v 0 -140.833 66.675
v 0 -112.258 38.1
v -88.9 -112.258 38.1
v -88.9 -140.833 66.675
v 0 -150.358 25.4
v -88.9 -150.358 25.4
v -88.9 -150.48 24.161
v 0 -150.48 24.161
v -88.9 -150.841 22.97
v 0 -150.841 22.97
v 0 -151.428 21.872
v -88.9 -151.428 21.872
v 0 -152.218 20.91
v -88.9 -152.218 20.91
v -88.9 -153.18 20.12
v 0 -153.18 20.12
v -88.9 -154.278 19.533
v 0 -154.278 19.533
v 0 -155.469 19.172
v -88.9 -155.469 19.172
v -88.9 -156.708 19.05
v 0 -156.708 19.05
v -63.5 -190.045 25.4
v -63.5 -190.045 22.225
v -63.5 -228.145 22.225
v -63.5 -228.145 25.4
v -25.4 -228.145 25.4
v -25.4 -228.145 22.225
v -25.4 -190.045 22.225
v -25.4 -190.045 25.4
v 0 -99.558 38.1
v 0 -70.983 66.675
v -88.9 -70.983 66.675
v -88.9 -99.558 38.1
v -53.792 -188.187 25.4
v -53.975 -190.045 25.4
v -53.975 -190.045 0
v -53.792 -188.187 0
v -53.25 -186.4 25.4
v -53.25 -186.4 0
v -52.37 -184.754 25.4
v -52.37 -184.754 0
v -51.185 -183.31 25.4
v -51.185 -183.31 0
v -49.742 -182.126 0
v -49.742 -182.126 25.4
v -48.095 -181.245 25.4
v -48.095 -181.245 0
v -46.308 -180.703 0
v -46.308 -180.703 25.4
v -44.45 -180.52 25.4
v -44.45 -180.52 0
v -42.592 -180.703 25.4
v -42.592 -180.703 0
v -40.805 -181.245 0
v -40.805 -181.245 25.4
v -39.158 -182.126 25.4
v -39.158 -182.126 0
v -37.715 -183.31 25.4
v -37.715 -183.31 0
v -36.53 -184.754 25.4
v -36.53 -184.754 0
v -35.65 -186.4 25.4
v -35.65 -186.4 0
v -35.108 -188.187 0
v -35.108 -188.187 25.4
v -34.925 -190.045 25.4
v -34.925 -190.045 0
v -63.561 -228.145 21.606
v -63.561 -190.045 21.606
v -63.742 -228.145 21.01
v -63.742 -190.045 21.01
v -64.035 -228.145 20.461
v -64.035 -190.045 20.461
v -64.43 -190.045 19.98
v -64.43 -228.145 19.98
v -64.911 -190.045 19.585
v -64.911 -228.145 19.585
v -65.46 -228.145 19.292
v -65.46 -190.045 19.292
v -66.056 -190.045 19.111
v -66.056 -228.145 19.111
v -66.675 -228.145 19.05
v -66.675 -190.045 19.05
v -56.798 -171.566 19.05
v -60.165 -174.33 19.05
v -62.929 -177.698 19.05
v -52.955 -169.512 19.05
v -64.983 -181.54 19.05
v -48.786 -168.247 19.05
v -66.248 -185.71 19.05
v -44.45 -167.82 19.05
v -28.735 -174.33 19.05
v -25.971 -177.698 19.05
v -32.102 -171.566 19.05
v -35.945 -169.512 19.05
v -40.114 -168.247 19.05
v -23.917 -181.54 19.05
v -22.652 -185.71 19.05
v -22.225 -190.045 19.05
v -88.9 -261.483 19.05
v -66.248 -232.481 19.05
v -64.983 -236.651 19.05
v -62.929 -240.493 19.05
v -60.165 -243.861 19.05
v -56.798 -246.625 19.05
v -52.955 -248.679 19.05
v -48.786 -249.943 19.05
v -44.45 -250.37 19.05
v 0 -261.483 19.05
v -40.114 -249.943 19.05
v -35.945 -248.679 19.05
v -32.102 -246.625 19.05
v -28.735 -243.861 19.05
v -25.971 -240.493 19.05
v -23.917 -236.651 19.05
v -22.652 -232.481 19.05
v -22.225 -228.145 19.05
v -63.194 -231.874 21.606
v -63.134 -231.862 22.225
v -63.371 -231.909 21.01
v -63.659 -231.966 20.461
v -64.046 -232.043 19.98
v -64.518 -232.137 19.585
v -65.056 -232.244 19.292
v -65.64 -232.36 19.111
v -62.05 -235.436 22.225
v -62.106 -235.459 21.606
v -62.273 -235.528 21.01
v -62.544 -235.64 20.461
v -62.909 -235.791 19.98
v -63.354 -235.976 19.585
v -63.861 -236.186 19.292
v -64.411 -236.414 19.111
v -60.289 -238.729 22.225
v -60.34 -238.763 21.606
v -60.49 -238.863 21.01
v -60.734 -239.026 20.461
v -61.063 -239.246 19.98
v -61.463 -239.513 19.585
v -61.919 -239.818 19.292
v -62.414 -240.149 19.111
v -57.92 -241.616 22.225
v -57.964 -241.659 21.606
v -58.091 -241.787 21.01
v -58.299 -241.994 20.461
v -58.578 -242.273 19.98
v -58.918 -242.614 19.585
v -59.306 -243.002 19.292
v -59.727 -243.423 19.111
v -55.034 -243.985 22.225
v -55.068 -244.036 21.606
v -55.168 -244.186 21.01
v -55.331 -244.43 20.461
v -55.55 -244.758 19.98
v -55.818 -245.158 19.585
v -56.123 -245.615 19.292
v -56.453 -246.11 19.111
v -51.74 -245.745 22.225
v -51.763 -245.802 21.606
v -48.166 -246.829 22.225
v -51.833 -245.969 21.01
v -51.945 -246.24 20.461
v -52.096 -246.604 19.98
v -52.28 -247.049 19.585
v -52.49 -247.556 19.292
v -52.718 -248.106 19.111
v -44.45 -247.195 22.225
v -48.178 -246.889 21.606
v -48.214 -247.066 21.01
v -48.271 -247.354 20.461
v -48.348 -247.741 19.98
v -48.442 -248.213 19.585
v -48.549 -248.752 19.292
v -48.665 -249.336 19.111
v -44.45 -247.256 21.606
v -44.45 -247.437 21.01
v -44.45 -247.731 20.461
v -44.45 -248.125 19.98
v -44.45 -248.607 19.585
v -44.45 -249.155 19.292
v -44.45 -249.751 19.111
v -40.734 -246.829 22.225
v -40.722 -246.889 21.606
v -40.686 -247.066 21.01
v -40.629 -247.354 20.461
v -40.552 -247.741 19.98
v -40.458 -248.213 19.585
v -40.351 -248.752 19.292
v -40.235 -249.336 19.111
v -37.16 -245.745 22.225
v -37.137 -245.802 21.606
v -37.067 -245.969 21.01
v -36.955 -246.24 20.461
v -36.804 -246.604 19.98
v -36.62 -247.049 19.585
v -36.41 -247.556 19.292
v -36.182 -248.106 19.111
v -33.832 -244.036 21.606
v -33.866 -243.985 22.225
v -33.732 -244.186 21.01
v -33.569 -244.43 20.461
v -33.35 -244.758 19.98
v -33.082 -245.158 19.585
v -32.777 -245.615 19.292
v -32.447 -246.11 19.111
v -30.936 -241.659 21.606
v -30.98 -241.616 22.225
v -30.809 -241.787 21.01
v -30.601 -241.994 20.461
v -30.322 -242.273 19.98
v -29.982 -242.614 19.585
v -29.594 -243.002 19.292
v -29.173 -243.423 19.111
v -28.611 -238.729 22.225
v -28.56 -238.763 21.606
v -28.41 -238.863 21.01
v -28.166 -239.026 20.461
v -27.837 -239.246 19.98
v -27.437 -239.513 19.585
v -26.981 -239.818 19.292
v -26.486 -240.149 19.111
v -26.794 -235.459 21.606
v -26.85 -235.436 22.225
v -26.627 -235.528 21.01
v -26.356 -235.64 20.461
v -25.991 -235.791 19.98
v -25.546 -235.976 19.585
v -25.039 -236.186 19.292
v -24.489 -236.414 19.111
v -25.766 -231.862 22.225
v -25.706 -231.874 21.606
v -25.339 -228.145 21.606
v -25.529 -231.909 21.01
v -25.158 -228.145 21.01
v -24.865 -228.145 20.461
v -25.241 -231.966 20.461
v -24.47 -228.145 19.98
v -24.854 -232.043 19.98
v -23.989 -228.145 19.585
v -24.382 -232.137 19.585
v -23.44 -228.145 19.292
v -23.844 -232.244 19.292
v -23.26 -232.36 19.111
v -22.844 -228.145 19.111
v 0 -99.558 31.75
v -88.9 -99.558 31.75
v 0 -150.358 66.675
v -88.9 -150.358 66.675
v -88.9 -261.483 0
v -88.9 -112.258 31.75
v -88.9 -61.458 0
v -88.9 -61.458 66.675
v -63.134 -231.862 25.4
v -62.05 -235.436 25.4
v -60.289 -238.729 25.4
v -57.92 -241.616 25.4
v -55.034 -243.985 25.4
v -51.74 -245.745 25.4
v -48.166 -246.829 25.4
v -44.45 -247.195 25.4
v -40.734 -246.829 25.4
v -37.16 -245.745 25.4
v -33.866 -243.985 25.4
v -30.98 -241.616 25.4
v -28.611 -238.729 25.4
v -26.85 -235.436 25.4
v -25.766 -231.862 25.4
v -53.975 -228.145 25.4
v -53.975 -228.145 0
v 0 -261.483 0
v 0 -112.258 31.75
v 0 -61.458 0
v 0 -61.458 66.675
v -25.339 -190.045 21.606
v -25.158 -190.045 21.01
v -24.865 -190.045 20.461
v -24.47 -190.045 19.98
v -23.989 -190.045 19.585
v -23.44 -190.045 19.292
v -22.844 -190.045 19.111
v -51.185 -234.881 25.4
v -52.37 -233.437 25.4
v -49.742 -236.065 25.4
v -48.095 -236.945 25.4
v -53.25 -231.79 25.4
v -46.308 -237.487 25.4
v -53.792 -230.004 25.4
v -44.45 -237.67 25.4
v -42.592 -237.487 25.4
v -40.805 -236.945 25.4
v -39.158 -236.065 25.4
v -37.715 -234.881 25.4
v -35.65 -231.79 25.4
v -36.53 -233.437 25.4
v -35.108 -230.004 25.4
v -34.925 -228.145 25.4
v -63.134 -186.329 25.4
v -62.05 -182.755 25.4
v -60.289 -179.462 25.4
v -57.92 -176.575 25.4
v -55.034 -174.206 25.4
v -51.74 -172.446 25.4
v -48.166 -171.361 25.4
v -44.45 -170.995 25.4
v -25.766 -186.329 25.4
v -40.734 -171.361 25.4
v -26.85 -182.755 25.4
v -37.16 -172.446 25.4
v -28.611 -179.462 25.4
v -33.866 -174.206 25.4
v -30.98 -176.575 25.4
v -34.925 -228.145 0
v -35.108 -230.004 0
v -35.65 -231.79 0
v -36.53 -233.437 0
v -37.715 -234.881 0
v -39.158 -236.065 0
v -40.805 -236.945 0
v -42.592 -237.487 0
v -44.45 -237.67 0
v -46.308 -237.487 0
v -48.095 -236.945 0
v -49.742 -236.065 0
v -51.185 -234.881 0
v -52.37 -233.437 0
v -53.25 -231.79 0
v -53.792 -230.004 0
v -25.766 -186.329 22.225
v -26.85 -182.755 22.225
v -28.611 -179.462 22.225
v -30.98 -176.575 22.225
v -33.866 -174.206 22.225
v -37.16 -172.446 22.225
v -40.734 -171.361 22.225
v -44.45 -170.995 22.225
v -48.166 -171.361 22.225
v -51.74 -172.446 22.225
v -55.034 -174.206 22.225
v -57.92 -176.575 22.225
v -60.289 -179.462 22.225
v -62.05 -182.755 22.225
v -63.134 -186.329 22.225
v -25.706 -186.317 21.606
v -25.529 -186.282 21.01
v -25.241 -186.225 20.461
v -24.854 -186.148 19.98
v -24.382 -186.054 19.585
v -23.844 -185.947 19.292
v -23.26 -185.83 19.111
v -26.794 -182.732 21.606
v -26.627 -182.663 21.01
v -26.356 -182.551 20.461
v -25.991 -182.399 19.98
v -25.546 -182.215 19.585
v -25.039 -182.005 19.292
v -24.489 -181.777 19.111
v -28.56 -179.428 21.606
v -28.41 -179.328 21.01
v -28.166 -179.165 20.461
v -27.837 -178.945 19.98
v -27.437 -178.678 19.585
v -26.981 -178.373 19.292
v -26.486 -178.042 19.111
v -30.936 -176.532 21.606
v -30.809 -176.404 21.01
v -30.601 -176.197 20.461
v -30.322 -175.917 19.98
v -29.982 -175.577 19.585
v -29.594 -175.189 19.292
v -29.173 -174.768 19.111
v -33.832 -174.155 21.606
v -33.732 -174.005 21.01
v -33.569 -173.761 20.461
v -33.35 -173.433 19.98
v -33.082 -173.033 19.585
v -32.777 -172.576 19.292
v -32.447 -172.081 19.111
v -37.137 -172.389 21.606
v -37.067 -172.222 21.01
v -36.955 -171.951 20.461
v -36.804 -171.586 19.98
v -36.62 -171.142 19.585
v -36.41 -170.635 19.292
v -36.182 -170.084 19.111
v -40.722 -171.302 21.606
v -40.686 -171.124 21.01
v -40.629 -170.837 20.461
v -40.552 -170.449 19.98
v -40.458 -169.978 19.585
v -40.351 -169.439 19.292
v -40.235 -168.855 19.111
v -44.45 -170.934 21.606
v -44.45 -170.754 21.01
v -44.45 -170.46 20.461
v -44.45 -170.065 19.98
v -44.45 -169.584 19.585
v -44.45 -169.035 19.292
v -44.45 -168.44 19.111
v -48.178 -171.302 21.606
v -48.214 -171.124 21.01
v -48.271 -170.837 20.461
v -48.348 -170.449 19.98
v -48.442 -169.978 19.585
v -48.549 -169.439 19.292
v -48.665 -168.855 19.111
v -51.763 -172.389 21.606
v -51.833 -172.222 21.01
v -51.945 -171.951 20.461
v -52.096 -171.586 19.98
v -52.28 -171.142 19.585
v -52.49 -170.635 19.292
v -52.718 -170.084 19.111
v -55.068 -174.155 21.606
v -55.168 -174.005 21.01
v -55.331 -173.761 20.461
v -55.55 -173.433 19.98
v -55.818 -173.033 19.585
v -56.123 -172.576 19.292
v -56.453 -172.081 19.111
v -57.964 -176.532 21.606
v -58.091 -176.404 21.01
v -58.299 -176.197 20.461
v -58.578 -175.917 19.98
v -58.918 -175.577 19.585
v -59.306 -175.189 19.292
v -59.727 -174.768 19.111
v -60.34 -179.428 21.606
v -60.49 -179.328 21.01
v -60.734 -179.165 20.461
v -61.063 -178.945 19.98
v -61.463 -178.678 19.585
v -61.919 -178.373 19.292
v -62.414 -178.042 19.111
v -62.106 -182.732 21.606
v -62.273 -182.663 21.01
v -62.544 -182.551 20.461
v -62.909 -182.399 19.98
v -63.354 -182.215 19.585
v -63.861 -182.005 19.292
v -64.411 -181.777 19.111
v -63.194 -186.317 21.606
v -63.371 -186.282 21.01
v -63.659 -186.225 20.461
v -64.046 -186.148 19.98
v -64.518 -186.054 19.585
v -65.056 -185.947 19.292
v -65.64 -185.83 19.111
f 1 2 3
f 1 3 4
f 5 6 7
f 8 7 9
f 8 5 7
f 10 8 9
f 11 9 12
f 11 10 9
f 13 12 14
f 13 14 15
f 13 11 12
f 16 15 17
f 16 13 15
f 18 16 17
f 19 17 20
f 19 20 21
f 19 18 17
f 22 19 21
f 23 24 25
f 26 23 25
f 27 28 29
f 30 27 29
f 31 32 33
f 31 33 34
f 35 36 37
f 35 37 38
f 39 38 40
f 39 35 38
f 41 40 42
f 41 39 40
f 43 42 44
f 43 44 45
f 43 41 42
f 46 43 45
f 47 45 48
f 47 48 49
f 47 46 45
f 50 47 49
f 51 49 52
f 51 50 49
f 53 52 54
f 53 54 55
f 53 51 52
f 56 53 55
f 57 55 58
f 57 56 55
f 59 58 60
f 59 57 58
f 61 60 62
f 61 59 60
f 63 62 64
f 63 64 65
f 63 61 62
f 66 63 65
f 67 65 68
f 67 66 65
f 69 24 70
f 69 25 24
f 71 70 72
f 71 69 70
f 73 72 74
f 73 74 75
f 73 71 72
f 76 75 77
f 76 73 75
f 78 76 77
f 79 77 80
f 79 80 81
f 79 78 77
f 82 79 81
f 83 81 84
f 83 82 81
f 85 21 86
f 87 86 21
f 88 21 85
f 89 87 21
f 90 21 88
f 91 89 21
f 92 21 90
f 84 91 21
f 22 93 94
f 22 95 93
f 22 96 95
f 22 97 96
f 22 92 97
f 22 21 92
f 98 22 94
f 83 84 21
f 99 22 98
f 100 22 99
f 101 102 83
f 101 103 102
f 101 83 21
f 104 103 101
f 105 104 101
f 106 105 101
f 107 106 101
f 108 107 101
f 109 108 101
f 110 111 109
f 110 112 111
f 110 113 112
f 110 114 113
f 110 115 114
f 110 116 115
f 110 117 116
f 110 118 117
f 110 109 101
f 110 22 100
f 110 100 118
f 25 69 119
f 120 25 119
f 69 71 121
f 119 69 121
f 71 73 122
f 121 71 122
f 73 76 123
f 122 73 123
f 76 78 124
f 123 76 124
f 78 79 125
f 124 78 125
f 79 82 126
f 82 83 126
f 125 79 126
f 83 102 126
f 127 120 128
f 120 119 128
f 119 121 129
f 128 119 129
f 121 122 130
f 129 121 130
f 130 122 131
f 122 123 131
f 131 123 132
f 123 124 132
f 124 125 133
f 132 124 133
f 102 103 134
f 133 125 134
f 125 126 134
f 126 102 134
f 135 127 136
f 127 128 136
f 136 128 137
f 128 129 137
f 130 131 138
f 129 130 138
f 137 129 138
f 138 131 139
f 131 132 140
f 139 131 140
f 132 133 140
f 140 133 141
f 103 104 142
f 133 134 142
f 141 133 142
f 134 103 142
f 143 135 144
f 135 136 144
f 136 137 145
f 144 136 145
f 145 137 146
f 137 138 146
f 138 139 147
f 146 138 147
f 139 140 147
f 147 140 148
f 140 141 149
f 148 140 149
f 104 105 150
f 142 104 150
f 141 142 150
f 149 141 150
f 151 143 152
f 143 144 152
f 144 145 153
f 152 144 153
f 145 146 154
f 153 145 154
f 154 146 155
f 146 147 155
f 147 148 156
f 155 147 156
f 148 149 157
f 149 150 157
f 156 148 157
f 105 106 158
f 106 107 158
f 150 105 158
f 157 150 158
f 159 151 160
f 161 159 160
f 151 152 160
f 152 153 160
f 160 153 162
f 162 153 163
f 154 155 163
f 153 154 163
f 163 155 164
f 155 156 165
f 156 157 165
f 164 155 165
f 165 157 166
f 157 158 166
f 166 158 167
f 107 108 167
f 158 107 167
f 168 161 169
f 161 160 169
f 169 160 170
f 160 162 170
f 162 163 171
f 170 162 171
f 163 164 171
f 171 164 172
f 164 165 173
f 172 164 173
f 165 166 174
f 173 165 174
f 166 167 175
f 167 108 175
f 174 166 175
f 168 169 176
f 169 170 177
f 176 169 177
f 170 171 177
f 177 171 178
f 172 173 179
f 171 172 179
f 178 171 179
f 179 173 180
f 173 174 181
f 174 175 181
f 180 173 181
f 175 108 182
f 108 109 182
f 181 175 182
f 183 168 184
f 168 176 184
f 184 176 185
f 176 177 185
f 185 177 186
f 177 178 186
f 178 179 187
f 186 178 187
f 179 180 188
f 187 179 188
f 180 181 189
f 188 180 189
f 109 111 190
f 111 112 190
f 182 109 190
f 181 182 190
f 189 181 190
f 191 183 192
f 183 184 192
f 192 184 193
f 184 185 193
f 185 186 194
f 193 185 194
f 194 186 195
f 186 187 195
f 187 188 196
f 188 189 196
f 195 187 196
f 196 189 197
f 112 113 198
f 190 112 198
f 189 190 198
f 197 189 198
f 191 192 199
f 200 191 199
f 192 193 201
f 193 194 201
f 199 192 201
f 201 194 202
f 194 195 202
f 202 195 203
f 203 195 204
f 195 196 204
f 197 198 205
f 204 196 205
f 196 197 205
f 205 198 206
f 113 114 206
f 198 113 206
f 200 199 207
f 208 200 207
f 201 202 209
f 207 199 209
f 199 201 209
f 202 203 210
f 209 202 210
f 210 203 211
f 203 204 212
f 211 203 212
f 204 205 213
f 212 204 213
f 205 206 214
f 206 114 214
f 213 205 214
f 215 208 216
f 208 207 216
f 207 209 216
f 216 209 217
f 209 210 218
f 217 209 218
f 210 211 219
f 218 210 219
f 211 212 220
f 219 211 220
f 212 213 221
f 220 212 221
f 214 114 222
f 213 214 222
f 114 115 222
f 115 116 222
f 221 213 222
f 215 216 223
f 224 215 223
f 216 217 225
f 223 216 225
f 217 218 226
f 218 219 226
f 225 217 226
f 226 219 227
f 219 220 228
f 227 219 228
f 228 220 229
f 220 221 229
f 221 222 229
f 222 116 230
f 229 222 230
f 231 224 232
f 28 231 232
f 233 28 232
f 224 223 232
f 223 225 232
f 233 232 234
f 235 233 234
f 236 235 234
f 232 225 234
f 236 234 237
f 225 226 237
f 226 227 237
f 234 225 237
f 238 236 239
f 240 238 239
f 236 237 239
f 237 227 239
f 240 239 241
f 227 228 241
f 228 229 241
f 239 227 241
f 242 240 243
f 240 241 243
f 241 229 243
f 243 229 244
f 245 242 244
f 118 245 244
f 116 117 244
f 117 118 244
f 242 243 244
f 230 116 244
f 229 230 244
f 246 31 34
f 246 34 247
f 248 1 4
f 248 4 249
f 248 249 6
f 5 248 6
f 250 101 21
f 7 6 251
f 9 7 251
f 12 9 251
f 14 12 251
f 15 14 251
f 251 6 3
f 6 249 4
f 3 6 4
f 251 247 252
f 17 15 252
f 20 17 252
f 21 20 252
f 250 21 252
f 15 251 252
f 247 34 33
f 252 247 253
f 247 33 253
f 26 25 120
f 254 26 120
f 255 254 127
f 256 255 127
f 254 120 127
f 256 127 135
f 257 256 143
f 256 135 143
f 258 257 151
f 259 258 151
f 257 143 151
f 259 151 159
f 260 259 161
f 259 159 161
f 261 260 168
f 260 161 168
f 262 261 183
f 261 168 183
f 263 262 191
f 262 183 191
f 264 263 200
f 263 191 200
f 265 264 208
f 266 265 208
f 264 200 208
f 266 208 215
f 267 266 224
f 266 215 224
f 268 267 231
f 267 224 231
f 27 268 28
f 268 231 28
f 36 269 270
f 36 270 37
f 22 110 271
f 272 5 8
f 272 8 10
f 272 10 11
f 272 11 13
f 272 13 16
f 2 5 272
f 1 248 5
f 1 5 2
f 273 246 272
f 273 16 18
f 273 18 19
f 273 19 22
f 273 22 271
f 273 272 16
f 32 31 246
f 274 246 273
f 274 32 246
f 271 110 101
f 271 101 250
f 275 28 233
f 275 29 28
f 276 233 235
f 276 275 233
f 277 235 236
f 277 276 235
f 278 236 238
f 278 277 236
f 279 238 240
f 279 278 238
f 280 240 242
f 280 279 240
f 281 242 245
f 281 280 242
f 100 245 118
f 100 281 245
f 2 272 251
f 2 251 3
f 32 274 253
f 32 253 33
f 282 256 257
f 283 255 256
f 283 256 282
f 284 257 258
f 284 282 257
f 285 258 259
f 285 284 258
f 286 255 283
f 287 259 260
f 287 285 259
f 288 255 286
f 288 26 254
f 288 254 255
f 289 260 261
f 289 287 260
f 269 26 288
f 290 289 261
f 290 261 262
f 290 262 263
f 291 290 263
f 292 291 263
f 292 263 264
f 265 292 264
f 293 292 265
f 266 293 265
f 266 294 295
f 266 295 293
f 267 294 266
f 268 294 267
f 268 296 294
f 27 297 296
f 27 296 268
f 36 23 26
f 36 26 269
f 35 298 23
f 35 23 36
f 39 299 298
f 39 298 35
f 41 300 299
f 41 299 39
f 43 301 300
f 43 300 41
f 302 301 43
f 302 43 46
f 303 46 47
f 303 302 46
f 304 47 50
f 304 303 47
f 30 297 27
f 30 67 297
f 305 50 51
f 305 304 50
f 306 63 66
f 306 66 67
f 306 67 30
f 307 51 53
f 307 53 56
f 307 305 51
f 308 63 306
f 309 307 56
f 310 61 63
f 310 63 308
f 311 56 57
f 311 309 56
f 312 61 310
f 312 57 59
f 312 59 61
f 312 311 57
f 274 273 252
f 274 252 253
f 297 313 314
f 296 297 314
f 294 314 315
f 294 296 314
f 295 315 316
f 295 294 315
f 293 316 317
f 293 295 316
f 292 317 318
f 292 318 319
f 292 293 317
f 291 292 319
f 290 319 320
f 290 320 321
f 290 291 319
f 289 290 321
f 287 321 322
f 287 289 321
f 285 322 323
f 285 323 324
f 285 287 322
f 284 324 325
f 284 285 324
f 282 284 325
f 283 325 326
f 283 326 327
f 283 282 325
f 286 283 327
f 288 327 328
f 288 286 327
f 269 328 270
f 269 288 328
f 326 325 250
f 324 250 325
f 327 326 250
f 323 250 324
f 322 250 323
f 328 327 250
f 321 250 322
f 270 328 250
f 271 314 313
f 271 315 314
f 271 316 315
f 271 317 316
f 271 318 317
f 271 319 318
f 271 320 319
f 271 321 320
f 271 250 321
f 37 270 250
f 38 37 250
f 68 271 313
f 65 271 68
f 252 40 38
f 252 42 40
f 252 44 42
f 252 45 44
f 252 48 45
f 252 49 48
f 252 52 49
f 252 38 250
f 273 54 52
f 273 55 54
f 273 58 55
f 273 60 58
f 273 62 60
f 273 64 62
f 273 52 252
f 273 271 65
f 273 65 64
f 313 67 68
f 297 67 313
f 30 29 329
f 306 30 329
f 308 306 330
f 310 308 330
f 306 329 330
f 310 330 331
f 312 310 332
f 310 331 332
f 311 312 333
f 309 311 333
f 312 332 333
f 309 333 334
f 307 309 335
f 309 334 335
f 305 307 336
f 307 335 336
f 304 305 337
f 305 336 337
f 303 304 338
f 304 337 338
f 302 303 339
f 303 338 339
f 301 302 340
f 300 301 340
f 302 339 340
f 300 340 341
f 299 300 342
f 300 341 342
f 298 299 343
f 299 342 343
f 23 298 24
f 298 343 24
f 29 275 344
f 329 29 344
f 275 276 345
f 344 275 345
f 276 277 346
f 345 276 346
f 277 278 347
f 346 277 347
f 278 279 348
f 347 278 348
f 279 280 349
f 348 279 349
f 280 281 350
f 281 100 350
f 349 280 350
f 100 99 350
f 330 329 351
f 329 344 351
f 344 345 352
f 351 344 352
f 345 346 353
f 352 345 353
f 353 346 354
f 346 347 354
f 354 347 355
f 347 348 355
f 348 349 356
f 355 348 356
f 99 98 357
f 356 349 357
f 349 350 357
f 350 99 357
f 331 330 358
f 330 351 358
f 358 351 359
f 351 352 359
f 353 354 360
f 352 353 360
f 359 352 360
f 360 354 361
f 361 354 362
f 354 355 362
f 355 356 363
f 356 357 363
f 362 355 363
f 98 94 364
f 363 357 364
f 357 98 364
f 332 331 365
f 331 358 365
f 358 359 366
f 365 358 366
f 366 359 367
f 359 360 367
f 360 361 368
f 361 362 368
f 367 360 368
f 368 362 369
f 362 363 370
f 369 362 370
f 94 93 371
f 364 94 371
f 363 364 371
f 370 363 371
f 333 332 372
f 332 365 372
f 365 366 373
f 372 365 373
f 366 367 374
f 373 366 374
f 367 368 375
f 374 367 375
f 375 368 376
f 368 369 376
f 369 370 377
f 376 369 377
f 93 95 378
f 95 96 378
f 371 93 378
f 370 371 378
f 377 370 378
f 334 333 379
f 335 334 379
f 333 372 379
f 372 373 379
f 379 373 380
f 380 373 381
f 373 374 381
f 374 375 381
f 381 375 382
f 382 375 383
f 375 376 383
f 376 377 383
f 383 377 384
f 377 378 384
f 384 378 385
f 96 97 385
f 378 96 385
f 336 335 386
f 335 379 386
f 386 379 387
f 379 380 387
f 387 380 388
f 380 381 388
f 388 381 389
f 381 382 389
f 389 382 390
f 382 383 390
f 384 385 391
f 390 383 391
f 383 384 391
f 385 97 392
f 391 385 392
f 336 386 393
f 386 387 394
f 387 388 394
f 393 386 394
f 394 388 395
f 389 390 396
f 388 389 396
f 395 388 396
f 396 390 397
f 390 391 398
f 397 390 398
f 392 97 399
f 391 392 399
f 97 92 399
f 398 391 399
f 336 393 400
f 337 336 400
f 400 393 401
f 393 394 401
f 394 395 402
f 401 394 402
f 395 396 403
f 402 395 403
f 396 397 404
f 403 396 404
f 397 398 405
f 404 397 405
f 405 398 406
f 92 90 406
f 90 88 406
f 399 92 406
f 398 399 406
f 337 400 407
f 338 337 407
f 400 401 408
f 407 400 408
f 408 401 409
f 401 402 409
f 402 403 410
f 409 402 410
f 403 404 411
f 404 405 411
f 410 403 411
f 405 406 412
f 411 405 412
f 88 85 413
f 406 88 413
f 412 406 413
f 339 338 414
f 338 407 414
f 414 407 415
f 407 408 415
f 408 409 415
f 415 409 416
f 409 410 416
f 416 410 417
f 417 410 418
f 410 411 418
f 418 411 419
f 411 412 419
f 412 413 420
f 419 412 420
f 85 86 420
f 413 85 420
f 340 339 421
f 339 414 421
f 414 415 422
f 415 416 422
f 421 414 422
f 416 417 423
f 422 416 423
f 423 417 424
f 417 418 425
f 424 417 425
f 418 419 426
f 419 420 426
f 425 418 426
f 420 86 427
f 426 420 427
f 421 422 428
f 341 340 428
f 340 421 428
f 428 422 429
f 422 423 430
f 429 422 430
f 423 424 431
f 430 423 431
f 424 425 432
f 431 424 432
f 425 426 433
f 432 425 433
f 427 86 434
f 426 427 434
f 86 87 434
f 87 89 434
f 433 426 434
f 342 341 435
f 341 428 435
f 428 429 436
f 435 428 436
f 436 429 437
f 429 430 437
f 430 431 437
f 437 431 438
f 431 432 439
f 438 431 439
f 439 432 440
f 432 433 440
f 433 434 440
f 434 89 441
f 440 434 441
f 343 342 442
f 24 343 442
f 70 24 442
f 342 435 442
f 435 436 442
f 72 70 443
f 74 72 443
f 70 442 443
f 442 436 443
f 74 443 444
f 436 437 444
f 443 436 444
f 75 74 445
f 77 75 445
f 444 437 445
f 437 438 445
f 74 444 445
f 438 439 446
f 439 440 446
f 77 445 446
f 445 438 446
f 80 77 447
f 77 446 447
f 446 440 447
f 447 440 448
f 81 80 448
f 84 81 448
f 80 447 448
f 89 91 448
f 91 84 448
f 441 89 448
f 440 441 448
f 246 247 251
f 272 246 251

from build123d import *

# Parameters (mm, degrees)
F1_DEPTH = 88.9
F3_DEPTH = 6.35
F4_DEPTH = 19.05
F5_R     = 3.175


# Not quite as in the source:
# - a length typed as a fraction of an inch, garbled in the dataset ("3 / 203.2 mm" for 3/8 in), is restored


with BuildPart() as f1:
    # F0 (on Right) → F1 (new body)
    with BuildSketch(Plane.YZ):
        with BuildLine():
            Line((-61.4579357207, 19.05), (-61.4579357207, 66.675))
            Line((-61.4579357207, 66.675), (-70.9829357207, 66.675))
            Line((-70.9829357207, 66.675), (-99.5579357207, 38.1))
            Line((-99.5579357207, 38.1), (-99.5579357207, 31.75))
            Line((-99.5579357207, 31.75), (-112.2579357207, 31.75))
            Line((-112.2579357207, 31.75), (-112.2579357207, 38.1))
            Line((-112.2579357207, 38.1), (-140.8329357207, 66.675))
            Line((-140.8329357207, 66.675), (-150.3579357207, 66.675))
            Line((-150.3579357207, 66.675), (-150.3579357207, 25.4))
            ThreePointArc((-150.3579357207, 25.4), (-152.2178076601, 20.9098719395), (-156.7079357207, 19.05))
            Line((-156.7079357207, 19.05), (-261.4829357207, 19.05))
            Line((-261.4829357207, 19.05), (-261.4829357207, 0))
            Line((-261.4829357207, 0), (-150.3579357207, 0))
            Line((-150.3579357207, 0), (-140.8329357207, 0))
            Line((-140.8329357207, 0), (-74.1579357207, 0))
            Line((-74.1579357207, 0), (-70.9829357207, 0))
            Line((-70.9829357207, 0), (-61.4579357207, 0))
            Line((-61.4579357207, 0), (-61.4579357207, 19.05))
        make_face()
    extrude(amount=-F1_DEPTH)

    # F2 (on face) → F3 (join)
    with BuildSketch(Plane.XY.offset(19.05)):
        with BuildLine():
            Line((-25.4, -228.1454357207), (-25.4, -190.0454357207))
            ThreePointArc((-25.4, -190.0454357207), (-44.45, -170.9954357207), (-63.5, -190.0454357207))
            Line((-63.5, -190.0454357207), (-63.5, -228.1454357207))
            ThreePointArc((-63.5, -228.1454357207), (-44.45, -247.1954357207), (-25.4, -228.1454357207))
        make_face()
        with BuildLine():
            ThreePointArc((-34.925, -228.1454357207), (-44.45, -237.6704357207), (-53.975, -228.1454357207))
            Line((-53.975, -228.1454357207), (-53.975, -190.0454357207))
            ThreePointArc((-53.975, -190.0454357207), (-44.45, -180.5204357207), (-34.925, -190.0454357207))
            Line((-34.925, -190.0454357207), (-34.925, -228.1454357207))
        make_face(mode=Mode.SUBTRACT)
    extrude(amount=F3_DEPTH)

    # F4 (cut): a face of the model
    f4_faces = [f1.faces().sort_by_distance(p)[0] for p in [
        (-44.45, -209.0954357207, 19.05),
    ]]
    extrude(f4_faces, amount=-F4_DEPTH, mode=Mode.SUBTRACT)

    # F5
    f5_edges = [f1.edges().sort_by_distance(p)[0] for p in [
        (-63.5, -209.095436, 19.05),
    ]]
    fillet(f5_edges, radius=F5_R)


solid = f1.part
